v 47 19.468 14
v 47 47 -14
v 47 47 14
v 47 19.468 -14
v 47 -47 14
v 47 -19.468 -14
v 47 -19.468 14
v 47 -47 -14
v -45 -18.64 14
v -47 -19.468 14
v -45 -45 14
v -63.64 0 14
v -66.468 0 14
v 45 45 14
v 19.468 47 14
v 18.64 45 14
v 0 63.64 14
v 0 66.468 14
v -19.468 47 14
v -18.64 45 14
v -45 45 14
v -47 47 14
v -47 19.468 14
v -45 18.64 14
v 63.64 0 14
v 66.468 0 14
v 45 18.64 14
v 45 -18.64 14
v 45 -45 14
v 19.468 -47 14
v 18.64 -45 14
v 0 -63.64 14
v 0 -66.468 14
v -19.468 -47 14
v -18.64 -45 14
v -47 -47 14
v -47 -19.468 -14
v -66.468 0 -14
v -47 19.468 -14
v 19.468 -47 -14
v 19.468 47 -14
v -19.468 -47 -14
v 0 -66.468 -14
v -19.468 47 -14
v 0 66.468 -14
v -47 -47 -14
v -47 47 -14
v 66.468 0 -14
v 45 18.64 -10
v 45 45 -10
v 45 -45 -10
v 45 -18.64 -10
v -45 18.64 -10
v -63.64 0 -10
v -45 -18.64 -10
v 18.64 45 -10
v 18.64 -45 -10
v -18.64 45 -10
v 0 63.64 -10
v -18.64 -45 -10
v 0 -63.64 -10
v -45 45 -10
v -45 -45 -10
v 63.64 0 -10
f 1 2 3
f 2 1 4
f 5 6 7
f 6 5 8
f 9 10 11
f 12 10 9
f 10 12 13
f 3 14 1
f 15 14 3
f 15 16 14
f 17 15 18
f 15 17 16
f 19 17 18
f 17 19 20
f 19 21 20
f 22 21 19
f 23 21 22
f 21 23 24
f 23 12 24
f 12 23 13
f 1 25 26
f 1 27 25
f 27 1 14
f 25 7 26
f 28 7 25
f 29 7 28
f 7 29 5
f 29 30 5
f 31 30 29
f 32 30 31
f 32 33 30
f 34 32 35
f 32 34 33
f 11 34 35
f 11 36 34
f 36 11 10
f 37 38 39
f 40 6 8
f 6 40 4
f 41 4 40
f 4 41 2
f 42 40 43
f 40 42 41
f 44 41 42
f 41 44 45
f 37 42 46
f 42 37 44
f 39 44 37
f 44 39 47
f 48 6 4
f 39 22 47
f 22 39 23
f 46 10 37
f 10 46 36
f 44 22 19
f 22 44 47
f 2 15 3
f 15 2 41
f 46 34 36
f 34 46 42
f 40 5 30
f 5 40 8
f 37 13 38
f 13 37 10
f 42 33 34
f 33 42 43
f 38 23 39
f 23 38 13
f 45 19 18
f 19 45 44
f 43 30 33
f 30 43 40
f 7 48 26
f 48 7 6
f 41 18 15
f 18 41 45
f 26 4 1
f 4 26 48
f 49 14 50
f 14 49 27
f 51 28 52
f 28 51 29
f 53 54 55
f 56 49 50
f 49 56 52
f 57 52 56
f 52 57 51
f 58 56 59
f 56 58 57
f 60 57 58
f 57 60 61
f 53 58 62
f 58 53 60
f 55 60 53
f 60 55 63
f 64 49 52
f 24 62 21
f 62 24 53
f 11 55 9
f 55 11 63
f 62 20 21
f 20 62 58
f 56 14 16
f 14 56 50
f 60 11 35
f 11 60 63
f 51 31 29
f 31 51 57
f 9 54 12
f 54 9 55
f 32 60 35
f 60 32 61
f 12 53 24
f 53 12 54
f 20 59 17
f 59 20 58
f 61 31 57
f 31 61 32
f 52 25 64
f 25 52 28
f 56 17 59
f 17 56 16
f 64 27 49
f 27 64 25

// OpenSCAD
card_size = 90;
cards_height = 24;
wall_thin = 2;

//top();
bottom();

module top()
{
    difference() 
    {
        top_part();
        
        my_text(-43,15,"github.com/");
        my_text(-43,-5,"format37/");
        my_text(-43,-25,"Spot-It");
    }
}

module my_text(x,y,text)
{
    translate([x,y,2]) 
    linear_extrude(4)
    text(text,12);
}

module top_part()
{
    outer(card_size+wall_thin*2,wall_thin);
    for (i=[0:1])
    {
        rotate([0,0,i*45])
        inner(card_size-1,wall_thin);
    }
}

module bottom()
{
    difference()
    {
        outer(card_size+wall_thin*2,cards_height+wall_thin*2);
        for (i=[0:1])
        {
            rotate([0,0,i*45])
            inner(card_size,cards_height);
        }
    }
}

module outer(s,h)
{
    for (i=[0:1])
    {
        rotate([0,0,i*45])
        cube([s,s,h],center = true);
    }
}

module inner(s,h)
{
    translate([0,0,wall_thin])
    cube([s,s,h],center = true);
}
